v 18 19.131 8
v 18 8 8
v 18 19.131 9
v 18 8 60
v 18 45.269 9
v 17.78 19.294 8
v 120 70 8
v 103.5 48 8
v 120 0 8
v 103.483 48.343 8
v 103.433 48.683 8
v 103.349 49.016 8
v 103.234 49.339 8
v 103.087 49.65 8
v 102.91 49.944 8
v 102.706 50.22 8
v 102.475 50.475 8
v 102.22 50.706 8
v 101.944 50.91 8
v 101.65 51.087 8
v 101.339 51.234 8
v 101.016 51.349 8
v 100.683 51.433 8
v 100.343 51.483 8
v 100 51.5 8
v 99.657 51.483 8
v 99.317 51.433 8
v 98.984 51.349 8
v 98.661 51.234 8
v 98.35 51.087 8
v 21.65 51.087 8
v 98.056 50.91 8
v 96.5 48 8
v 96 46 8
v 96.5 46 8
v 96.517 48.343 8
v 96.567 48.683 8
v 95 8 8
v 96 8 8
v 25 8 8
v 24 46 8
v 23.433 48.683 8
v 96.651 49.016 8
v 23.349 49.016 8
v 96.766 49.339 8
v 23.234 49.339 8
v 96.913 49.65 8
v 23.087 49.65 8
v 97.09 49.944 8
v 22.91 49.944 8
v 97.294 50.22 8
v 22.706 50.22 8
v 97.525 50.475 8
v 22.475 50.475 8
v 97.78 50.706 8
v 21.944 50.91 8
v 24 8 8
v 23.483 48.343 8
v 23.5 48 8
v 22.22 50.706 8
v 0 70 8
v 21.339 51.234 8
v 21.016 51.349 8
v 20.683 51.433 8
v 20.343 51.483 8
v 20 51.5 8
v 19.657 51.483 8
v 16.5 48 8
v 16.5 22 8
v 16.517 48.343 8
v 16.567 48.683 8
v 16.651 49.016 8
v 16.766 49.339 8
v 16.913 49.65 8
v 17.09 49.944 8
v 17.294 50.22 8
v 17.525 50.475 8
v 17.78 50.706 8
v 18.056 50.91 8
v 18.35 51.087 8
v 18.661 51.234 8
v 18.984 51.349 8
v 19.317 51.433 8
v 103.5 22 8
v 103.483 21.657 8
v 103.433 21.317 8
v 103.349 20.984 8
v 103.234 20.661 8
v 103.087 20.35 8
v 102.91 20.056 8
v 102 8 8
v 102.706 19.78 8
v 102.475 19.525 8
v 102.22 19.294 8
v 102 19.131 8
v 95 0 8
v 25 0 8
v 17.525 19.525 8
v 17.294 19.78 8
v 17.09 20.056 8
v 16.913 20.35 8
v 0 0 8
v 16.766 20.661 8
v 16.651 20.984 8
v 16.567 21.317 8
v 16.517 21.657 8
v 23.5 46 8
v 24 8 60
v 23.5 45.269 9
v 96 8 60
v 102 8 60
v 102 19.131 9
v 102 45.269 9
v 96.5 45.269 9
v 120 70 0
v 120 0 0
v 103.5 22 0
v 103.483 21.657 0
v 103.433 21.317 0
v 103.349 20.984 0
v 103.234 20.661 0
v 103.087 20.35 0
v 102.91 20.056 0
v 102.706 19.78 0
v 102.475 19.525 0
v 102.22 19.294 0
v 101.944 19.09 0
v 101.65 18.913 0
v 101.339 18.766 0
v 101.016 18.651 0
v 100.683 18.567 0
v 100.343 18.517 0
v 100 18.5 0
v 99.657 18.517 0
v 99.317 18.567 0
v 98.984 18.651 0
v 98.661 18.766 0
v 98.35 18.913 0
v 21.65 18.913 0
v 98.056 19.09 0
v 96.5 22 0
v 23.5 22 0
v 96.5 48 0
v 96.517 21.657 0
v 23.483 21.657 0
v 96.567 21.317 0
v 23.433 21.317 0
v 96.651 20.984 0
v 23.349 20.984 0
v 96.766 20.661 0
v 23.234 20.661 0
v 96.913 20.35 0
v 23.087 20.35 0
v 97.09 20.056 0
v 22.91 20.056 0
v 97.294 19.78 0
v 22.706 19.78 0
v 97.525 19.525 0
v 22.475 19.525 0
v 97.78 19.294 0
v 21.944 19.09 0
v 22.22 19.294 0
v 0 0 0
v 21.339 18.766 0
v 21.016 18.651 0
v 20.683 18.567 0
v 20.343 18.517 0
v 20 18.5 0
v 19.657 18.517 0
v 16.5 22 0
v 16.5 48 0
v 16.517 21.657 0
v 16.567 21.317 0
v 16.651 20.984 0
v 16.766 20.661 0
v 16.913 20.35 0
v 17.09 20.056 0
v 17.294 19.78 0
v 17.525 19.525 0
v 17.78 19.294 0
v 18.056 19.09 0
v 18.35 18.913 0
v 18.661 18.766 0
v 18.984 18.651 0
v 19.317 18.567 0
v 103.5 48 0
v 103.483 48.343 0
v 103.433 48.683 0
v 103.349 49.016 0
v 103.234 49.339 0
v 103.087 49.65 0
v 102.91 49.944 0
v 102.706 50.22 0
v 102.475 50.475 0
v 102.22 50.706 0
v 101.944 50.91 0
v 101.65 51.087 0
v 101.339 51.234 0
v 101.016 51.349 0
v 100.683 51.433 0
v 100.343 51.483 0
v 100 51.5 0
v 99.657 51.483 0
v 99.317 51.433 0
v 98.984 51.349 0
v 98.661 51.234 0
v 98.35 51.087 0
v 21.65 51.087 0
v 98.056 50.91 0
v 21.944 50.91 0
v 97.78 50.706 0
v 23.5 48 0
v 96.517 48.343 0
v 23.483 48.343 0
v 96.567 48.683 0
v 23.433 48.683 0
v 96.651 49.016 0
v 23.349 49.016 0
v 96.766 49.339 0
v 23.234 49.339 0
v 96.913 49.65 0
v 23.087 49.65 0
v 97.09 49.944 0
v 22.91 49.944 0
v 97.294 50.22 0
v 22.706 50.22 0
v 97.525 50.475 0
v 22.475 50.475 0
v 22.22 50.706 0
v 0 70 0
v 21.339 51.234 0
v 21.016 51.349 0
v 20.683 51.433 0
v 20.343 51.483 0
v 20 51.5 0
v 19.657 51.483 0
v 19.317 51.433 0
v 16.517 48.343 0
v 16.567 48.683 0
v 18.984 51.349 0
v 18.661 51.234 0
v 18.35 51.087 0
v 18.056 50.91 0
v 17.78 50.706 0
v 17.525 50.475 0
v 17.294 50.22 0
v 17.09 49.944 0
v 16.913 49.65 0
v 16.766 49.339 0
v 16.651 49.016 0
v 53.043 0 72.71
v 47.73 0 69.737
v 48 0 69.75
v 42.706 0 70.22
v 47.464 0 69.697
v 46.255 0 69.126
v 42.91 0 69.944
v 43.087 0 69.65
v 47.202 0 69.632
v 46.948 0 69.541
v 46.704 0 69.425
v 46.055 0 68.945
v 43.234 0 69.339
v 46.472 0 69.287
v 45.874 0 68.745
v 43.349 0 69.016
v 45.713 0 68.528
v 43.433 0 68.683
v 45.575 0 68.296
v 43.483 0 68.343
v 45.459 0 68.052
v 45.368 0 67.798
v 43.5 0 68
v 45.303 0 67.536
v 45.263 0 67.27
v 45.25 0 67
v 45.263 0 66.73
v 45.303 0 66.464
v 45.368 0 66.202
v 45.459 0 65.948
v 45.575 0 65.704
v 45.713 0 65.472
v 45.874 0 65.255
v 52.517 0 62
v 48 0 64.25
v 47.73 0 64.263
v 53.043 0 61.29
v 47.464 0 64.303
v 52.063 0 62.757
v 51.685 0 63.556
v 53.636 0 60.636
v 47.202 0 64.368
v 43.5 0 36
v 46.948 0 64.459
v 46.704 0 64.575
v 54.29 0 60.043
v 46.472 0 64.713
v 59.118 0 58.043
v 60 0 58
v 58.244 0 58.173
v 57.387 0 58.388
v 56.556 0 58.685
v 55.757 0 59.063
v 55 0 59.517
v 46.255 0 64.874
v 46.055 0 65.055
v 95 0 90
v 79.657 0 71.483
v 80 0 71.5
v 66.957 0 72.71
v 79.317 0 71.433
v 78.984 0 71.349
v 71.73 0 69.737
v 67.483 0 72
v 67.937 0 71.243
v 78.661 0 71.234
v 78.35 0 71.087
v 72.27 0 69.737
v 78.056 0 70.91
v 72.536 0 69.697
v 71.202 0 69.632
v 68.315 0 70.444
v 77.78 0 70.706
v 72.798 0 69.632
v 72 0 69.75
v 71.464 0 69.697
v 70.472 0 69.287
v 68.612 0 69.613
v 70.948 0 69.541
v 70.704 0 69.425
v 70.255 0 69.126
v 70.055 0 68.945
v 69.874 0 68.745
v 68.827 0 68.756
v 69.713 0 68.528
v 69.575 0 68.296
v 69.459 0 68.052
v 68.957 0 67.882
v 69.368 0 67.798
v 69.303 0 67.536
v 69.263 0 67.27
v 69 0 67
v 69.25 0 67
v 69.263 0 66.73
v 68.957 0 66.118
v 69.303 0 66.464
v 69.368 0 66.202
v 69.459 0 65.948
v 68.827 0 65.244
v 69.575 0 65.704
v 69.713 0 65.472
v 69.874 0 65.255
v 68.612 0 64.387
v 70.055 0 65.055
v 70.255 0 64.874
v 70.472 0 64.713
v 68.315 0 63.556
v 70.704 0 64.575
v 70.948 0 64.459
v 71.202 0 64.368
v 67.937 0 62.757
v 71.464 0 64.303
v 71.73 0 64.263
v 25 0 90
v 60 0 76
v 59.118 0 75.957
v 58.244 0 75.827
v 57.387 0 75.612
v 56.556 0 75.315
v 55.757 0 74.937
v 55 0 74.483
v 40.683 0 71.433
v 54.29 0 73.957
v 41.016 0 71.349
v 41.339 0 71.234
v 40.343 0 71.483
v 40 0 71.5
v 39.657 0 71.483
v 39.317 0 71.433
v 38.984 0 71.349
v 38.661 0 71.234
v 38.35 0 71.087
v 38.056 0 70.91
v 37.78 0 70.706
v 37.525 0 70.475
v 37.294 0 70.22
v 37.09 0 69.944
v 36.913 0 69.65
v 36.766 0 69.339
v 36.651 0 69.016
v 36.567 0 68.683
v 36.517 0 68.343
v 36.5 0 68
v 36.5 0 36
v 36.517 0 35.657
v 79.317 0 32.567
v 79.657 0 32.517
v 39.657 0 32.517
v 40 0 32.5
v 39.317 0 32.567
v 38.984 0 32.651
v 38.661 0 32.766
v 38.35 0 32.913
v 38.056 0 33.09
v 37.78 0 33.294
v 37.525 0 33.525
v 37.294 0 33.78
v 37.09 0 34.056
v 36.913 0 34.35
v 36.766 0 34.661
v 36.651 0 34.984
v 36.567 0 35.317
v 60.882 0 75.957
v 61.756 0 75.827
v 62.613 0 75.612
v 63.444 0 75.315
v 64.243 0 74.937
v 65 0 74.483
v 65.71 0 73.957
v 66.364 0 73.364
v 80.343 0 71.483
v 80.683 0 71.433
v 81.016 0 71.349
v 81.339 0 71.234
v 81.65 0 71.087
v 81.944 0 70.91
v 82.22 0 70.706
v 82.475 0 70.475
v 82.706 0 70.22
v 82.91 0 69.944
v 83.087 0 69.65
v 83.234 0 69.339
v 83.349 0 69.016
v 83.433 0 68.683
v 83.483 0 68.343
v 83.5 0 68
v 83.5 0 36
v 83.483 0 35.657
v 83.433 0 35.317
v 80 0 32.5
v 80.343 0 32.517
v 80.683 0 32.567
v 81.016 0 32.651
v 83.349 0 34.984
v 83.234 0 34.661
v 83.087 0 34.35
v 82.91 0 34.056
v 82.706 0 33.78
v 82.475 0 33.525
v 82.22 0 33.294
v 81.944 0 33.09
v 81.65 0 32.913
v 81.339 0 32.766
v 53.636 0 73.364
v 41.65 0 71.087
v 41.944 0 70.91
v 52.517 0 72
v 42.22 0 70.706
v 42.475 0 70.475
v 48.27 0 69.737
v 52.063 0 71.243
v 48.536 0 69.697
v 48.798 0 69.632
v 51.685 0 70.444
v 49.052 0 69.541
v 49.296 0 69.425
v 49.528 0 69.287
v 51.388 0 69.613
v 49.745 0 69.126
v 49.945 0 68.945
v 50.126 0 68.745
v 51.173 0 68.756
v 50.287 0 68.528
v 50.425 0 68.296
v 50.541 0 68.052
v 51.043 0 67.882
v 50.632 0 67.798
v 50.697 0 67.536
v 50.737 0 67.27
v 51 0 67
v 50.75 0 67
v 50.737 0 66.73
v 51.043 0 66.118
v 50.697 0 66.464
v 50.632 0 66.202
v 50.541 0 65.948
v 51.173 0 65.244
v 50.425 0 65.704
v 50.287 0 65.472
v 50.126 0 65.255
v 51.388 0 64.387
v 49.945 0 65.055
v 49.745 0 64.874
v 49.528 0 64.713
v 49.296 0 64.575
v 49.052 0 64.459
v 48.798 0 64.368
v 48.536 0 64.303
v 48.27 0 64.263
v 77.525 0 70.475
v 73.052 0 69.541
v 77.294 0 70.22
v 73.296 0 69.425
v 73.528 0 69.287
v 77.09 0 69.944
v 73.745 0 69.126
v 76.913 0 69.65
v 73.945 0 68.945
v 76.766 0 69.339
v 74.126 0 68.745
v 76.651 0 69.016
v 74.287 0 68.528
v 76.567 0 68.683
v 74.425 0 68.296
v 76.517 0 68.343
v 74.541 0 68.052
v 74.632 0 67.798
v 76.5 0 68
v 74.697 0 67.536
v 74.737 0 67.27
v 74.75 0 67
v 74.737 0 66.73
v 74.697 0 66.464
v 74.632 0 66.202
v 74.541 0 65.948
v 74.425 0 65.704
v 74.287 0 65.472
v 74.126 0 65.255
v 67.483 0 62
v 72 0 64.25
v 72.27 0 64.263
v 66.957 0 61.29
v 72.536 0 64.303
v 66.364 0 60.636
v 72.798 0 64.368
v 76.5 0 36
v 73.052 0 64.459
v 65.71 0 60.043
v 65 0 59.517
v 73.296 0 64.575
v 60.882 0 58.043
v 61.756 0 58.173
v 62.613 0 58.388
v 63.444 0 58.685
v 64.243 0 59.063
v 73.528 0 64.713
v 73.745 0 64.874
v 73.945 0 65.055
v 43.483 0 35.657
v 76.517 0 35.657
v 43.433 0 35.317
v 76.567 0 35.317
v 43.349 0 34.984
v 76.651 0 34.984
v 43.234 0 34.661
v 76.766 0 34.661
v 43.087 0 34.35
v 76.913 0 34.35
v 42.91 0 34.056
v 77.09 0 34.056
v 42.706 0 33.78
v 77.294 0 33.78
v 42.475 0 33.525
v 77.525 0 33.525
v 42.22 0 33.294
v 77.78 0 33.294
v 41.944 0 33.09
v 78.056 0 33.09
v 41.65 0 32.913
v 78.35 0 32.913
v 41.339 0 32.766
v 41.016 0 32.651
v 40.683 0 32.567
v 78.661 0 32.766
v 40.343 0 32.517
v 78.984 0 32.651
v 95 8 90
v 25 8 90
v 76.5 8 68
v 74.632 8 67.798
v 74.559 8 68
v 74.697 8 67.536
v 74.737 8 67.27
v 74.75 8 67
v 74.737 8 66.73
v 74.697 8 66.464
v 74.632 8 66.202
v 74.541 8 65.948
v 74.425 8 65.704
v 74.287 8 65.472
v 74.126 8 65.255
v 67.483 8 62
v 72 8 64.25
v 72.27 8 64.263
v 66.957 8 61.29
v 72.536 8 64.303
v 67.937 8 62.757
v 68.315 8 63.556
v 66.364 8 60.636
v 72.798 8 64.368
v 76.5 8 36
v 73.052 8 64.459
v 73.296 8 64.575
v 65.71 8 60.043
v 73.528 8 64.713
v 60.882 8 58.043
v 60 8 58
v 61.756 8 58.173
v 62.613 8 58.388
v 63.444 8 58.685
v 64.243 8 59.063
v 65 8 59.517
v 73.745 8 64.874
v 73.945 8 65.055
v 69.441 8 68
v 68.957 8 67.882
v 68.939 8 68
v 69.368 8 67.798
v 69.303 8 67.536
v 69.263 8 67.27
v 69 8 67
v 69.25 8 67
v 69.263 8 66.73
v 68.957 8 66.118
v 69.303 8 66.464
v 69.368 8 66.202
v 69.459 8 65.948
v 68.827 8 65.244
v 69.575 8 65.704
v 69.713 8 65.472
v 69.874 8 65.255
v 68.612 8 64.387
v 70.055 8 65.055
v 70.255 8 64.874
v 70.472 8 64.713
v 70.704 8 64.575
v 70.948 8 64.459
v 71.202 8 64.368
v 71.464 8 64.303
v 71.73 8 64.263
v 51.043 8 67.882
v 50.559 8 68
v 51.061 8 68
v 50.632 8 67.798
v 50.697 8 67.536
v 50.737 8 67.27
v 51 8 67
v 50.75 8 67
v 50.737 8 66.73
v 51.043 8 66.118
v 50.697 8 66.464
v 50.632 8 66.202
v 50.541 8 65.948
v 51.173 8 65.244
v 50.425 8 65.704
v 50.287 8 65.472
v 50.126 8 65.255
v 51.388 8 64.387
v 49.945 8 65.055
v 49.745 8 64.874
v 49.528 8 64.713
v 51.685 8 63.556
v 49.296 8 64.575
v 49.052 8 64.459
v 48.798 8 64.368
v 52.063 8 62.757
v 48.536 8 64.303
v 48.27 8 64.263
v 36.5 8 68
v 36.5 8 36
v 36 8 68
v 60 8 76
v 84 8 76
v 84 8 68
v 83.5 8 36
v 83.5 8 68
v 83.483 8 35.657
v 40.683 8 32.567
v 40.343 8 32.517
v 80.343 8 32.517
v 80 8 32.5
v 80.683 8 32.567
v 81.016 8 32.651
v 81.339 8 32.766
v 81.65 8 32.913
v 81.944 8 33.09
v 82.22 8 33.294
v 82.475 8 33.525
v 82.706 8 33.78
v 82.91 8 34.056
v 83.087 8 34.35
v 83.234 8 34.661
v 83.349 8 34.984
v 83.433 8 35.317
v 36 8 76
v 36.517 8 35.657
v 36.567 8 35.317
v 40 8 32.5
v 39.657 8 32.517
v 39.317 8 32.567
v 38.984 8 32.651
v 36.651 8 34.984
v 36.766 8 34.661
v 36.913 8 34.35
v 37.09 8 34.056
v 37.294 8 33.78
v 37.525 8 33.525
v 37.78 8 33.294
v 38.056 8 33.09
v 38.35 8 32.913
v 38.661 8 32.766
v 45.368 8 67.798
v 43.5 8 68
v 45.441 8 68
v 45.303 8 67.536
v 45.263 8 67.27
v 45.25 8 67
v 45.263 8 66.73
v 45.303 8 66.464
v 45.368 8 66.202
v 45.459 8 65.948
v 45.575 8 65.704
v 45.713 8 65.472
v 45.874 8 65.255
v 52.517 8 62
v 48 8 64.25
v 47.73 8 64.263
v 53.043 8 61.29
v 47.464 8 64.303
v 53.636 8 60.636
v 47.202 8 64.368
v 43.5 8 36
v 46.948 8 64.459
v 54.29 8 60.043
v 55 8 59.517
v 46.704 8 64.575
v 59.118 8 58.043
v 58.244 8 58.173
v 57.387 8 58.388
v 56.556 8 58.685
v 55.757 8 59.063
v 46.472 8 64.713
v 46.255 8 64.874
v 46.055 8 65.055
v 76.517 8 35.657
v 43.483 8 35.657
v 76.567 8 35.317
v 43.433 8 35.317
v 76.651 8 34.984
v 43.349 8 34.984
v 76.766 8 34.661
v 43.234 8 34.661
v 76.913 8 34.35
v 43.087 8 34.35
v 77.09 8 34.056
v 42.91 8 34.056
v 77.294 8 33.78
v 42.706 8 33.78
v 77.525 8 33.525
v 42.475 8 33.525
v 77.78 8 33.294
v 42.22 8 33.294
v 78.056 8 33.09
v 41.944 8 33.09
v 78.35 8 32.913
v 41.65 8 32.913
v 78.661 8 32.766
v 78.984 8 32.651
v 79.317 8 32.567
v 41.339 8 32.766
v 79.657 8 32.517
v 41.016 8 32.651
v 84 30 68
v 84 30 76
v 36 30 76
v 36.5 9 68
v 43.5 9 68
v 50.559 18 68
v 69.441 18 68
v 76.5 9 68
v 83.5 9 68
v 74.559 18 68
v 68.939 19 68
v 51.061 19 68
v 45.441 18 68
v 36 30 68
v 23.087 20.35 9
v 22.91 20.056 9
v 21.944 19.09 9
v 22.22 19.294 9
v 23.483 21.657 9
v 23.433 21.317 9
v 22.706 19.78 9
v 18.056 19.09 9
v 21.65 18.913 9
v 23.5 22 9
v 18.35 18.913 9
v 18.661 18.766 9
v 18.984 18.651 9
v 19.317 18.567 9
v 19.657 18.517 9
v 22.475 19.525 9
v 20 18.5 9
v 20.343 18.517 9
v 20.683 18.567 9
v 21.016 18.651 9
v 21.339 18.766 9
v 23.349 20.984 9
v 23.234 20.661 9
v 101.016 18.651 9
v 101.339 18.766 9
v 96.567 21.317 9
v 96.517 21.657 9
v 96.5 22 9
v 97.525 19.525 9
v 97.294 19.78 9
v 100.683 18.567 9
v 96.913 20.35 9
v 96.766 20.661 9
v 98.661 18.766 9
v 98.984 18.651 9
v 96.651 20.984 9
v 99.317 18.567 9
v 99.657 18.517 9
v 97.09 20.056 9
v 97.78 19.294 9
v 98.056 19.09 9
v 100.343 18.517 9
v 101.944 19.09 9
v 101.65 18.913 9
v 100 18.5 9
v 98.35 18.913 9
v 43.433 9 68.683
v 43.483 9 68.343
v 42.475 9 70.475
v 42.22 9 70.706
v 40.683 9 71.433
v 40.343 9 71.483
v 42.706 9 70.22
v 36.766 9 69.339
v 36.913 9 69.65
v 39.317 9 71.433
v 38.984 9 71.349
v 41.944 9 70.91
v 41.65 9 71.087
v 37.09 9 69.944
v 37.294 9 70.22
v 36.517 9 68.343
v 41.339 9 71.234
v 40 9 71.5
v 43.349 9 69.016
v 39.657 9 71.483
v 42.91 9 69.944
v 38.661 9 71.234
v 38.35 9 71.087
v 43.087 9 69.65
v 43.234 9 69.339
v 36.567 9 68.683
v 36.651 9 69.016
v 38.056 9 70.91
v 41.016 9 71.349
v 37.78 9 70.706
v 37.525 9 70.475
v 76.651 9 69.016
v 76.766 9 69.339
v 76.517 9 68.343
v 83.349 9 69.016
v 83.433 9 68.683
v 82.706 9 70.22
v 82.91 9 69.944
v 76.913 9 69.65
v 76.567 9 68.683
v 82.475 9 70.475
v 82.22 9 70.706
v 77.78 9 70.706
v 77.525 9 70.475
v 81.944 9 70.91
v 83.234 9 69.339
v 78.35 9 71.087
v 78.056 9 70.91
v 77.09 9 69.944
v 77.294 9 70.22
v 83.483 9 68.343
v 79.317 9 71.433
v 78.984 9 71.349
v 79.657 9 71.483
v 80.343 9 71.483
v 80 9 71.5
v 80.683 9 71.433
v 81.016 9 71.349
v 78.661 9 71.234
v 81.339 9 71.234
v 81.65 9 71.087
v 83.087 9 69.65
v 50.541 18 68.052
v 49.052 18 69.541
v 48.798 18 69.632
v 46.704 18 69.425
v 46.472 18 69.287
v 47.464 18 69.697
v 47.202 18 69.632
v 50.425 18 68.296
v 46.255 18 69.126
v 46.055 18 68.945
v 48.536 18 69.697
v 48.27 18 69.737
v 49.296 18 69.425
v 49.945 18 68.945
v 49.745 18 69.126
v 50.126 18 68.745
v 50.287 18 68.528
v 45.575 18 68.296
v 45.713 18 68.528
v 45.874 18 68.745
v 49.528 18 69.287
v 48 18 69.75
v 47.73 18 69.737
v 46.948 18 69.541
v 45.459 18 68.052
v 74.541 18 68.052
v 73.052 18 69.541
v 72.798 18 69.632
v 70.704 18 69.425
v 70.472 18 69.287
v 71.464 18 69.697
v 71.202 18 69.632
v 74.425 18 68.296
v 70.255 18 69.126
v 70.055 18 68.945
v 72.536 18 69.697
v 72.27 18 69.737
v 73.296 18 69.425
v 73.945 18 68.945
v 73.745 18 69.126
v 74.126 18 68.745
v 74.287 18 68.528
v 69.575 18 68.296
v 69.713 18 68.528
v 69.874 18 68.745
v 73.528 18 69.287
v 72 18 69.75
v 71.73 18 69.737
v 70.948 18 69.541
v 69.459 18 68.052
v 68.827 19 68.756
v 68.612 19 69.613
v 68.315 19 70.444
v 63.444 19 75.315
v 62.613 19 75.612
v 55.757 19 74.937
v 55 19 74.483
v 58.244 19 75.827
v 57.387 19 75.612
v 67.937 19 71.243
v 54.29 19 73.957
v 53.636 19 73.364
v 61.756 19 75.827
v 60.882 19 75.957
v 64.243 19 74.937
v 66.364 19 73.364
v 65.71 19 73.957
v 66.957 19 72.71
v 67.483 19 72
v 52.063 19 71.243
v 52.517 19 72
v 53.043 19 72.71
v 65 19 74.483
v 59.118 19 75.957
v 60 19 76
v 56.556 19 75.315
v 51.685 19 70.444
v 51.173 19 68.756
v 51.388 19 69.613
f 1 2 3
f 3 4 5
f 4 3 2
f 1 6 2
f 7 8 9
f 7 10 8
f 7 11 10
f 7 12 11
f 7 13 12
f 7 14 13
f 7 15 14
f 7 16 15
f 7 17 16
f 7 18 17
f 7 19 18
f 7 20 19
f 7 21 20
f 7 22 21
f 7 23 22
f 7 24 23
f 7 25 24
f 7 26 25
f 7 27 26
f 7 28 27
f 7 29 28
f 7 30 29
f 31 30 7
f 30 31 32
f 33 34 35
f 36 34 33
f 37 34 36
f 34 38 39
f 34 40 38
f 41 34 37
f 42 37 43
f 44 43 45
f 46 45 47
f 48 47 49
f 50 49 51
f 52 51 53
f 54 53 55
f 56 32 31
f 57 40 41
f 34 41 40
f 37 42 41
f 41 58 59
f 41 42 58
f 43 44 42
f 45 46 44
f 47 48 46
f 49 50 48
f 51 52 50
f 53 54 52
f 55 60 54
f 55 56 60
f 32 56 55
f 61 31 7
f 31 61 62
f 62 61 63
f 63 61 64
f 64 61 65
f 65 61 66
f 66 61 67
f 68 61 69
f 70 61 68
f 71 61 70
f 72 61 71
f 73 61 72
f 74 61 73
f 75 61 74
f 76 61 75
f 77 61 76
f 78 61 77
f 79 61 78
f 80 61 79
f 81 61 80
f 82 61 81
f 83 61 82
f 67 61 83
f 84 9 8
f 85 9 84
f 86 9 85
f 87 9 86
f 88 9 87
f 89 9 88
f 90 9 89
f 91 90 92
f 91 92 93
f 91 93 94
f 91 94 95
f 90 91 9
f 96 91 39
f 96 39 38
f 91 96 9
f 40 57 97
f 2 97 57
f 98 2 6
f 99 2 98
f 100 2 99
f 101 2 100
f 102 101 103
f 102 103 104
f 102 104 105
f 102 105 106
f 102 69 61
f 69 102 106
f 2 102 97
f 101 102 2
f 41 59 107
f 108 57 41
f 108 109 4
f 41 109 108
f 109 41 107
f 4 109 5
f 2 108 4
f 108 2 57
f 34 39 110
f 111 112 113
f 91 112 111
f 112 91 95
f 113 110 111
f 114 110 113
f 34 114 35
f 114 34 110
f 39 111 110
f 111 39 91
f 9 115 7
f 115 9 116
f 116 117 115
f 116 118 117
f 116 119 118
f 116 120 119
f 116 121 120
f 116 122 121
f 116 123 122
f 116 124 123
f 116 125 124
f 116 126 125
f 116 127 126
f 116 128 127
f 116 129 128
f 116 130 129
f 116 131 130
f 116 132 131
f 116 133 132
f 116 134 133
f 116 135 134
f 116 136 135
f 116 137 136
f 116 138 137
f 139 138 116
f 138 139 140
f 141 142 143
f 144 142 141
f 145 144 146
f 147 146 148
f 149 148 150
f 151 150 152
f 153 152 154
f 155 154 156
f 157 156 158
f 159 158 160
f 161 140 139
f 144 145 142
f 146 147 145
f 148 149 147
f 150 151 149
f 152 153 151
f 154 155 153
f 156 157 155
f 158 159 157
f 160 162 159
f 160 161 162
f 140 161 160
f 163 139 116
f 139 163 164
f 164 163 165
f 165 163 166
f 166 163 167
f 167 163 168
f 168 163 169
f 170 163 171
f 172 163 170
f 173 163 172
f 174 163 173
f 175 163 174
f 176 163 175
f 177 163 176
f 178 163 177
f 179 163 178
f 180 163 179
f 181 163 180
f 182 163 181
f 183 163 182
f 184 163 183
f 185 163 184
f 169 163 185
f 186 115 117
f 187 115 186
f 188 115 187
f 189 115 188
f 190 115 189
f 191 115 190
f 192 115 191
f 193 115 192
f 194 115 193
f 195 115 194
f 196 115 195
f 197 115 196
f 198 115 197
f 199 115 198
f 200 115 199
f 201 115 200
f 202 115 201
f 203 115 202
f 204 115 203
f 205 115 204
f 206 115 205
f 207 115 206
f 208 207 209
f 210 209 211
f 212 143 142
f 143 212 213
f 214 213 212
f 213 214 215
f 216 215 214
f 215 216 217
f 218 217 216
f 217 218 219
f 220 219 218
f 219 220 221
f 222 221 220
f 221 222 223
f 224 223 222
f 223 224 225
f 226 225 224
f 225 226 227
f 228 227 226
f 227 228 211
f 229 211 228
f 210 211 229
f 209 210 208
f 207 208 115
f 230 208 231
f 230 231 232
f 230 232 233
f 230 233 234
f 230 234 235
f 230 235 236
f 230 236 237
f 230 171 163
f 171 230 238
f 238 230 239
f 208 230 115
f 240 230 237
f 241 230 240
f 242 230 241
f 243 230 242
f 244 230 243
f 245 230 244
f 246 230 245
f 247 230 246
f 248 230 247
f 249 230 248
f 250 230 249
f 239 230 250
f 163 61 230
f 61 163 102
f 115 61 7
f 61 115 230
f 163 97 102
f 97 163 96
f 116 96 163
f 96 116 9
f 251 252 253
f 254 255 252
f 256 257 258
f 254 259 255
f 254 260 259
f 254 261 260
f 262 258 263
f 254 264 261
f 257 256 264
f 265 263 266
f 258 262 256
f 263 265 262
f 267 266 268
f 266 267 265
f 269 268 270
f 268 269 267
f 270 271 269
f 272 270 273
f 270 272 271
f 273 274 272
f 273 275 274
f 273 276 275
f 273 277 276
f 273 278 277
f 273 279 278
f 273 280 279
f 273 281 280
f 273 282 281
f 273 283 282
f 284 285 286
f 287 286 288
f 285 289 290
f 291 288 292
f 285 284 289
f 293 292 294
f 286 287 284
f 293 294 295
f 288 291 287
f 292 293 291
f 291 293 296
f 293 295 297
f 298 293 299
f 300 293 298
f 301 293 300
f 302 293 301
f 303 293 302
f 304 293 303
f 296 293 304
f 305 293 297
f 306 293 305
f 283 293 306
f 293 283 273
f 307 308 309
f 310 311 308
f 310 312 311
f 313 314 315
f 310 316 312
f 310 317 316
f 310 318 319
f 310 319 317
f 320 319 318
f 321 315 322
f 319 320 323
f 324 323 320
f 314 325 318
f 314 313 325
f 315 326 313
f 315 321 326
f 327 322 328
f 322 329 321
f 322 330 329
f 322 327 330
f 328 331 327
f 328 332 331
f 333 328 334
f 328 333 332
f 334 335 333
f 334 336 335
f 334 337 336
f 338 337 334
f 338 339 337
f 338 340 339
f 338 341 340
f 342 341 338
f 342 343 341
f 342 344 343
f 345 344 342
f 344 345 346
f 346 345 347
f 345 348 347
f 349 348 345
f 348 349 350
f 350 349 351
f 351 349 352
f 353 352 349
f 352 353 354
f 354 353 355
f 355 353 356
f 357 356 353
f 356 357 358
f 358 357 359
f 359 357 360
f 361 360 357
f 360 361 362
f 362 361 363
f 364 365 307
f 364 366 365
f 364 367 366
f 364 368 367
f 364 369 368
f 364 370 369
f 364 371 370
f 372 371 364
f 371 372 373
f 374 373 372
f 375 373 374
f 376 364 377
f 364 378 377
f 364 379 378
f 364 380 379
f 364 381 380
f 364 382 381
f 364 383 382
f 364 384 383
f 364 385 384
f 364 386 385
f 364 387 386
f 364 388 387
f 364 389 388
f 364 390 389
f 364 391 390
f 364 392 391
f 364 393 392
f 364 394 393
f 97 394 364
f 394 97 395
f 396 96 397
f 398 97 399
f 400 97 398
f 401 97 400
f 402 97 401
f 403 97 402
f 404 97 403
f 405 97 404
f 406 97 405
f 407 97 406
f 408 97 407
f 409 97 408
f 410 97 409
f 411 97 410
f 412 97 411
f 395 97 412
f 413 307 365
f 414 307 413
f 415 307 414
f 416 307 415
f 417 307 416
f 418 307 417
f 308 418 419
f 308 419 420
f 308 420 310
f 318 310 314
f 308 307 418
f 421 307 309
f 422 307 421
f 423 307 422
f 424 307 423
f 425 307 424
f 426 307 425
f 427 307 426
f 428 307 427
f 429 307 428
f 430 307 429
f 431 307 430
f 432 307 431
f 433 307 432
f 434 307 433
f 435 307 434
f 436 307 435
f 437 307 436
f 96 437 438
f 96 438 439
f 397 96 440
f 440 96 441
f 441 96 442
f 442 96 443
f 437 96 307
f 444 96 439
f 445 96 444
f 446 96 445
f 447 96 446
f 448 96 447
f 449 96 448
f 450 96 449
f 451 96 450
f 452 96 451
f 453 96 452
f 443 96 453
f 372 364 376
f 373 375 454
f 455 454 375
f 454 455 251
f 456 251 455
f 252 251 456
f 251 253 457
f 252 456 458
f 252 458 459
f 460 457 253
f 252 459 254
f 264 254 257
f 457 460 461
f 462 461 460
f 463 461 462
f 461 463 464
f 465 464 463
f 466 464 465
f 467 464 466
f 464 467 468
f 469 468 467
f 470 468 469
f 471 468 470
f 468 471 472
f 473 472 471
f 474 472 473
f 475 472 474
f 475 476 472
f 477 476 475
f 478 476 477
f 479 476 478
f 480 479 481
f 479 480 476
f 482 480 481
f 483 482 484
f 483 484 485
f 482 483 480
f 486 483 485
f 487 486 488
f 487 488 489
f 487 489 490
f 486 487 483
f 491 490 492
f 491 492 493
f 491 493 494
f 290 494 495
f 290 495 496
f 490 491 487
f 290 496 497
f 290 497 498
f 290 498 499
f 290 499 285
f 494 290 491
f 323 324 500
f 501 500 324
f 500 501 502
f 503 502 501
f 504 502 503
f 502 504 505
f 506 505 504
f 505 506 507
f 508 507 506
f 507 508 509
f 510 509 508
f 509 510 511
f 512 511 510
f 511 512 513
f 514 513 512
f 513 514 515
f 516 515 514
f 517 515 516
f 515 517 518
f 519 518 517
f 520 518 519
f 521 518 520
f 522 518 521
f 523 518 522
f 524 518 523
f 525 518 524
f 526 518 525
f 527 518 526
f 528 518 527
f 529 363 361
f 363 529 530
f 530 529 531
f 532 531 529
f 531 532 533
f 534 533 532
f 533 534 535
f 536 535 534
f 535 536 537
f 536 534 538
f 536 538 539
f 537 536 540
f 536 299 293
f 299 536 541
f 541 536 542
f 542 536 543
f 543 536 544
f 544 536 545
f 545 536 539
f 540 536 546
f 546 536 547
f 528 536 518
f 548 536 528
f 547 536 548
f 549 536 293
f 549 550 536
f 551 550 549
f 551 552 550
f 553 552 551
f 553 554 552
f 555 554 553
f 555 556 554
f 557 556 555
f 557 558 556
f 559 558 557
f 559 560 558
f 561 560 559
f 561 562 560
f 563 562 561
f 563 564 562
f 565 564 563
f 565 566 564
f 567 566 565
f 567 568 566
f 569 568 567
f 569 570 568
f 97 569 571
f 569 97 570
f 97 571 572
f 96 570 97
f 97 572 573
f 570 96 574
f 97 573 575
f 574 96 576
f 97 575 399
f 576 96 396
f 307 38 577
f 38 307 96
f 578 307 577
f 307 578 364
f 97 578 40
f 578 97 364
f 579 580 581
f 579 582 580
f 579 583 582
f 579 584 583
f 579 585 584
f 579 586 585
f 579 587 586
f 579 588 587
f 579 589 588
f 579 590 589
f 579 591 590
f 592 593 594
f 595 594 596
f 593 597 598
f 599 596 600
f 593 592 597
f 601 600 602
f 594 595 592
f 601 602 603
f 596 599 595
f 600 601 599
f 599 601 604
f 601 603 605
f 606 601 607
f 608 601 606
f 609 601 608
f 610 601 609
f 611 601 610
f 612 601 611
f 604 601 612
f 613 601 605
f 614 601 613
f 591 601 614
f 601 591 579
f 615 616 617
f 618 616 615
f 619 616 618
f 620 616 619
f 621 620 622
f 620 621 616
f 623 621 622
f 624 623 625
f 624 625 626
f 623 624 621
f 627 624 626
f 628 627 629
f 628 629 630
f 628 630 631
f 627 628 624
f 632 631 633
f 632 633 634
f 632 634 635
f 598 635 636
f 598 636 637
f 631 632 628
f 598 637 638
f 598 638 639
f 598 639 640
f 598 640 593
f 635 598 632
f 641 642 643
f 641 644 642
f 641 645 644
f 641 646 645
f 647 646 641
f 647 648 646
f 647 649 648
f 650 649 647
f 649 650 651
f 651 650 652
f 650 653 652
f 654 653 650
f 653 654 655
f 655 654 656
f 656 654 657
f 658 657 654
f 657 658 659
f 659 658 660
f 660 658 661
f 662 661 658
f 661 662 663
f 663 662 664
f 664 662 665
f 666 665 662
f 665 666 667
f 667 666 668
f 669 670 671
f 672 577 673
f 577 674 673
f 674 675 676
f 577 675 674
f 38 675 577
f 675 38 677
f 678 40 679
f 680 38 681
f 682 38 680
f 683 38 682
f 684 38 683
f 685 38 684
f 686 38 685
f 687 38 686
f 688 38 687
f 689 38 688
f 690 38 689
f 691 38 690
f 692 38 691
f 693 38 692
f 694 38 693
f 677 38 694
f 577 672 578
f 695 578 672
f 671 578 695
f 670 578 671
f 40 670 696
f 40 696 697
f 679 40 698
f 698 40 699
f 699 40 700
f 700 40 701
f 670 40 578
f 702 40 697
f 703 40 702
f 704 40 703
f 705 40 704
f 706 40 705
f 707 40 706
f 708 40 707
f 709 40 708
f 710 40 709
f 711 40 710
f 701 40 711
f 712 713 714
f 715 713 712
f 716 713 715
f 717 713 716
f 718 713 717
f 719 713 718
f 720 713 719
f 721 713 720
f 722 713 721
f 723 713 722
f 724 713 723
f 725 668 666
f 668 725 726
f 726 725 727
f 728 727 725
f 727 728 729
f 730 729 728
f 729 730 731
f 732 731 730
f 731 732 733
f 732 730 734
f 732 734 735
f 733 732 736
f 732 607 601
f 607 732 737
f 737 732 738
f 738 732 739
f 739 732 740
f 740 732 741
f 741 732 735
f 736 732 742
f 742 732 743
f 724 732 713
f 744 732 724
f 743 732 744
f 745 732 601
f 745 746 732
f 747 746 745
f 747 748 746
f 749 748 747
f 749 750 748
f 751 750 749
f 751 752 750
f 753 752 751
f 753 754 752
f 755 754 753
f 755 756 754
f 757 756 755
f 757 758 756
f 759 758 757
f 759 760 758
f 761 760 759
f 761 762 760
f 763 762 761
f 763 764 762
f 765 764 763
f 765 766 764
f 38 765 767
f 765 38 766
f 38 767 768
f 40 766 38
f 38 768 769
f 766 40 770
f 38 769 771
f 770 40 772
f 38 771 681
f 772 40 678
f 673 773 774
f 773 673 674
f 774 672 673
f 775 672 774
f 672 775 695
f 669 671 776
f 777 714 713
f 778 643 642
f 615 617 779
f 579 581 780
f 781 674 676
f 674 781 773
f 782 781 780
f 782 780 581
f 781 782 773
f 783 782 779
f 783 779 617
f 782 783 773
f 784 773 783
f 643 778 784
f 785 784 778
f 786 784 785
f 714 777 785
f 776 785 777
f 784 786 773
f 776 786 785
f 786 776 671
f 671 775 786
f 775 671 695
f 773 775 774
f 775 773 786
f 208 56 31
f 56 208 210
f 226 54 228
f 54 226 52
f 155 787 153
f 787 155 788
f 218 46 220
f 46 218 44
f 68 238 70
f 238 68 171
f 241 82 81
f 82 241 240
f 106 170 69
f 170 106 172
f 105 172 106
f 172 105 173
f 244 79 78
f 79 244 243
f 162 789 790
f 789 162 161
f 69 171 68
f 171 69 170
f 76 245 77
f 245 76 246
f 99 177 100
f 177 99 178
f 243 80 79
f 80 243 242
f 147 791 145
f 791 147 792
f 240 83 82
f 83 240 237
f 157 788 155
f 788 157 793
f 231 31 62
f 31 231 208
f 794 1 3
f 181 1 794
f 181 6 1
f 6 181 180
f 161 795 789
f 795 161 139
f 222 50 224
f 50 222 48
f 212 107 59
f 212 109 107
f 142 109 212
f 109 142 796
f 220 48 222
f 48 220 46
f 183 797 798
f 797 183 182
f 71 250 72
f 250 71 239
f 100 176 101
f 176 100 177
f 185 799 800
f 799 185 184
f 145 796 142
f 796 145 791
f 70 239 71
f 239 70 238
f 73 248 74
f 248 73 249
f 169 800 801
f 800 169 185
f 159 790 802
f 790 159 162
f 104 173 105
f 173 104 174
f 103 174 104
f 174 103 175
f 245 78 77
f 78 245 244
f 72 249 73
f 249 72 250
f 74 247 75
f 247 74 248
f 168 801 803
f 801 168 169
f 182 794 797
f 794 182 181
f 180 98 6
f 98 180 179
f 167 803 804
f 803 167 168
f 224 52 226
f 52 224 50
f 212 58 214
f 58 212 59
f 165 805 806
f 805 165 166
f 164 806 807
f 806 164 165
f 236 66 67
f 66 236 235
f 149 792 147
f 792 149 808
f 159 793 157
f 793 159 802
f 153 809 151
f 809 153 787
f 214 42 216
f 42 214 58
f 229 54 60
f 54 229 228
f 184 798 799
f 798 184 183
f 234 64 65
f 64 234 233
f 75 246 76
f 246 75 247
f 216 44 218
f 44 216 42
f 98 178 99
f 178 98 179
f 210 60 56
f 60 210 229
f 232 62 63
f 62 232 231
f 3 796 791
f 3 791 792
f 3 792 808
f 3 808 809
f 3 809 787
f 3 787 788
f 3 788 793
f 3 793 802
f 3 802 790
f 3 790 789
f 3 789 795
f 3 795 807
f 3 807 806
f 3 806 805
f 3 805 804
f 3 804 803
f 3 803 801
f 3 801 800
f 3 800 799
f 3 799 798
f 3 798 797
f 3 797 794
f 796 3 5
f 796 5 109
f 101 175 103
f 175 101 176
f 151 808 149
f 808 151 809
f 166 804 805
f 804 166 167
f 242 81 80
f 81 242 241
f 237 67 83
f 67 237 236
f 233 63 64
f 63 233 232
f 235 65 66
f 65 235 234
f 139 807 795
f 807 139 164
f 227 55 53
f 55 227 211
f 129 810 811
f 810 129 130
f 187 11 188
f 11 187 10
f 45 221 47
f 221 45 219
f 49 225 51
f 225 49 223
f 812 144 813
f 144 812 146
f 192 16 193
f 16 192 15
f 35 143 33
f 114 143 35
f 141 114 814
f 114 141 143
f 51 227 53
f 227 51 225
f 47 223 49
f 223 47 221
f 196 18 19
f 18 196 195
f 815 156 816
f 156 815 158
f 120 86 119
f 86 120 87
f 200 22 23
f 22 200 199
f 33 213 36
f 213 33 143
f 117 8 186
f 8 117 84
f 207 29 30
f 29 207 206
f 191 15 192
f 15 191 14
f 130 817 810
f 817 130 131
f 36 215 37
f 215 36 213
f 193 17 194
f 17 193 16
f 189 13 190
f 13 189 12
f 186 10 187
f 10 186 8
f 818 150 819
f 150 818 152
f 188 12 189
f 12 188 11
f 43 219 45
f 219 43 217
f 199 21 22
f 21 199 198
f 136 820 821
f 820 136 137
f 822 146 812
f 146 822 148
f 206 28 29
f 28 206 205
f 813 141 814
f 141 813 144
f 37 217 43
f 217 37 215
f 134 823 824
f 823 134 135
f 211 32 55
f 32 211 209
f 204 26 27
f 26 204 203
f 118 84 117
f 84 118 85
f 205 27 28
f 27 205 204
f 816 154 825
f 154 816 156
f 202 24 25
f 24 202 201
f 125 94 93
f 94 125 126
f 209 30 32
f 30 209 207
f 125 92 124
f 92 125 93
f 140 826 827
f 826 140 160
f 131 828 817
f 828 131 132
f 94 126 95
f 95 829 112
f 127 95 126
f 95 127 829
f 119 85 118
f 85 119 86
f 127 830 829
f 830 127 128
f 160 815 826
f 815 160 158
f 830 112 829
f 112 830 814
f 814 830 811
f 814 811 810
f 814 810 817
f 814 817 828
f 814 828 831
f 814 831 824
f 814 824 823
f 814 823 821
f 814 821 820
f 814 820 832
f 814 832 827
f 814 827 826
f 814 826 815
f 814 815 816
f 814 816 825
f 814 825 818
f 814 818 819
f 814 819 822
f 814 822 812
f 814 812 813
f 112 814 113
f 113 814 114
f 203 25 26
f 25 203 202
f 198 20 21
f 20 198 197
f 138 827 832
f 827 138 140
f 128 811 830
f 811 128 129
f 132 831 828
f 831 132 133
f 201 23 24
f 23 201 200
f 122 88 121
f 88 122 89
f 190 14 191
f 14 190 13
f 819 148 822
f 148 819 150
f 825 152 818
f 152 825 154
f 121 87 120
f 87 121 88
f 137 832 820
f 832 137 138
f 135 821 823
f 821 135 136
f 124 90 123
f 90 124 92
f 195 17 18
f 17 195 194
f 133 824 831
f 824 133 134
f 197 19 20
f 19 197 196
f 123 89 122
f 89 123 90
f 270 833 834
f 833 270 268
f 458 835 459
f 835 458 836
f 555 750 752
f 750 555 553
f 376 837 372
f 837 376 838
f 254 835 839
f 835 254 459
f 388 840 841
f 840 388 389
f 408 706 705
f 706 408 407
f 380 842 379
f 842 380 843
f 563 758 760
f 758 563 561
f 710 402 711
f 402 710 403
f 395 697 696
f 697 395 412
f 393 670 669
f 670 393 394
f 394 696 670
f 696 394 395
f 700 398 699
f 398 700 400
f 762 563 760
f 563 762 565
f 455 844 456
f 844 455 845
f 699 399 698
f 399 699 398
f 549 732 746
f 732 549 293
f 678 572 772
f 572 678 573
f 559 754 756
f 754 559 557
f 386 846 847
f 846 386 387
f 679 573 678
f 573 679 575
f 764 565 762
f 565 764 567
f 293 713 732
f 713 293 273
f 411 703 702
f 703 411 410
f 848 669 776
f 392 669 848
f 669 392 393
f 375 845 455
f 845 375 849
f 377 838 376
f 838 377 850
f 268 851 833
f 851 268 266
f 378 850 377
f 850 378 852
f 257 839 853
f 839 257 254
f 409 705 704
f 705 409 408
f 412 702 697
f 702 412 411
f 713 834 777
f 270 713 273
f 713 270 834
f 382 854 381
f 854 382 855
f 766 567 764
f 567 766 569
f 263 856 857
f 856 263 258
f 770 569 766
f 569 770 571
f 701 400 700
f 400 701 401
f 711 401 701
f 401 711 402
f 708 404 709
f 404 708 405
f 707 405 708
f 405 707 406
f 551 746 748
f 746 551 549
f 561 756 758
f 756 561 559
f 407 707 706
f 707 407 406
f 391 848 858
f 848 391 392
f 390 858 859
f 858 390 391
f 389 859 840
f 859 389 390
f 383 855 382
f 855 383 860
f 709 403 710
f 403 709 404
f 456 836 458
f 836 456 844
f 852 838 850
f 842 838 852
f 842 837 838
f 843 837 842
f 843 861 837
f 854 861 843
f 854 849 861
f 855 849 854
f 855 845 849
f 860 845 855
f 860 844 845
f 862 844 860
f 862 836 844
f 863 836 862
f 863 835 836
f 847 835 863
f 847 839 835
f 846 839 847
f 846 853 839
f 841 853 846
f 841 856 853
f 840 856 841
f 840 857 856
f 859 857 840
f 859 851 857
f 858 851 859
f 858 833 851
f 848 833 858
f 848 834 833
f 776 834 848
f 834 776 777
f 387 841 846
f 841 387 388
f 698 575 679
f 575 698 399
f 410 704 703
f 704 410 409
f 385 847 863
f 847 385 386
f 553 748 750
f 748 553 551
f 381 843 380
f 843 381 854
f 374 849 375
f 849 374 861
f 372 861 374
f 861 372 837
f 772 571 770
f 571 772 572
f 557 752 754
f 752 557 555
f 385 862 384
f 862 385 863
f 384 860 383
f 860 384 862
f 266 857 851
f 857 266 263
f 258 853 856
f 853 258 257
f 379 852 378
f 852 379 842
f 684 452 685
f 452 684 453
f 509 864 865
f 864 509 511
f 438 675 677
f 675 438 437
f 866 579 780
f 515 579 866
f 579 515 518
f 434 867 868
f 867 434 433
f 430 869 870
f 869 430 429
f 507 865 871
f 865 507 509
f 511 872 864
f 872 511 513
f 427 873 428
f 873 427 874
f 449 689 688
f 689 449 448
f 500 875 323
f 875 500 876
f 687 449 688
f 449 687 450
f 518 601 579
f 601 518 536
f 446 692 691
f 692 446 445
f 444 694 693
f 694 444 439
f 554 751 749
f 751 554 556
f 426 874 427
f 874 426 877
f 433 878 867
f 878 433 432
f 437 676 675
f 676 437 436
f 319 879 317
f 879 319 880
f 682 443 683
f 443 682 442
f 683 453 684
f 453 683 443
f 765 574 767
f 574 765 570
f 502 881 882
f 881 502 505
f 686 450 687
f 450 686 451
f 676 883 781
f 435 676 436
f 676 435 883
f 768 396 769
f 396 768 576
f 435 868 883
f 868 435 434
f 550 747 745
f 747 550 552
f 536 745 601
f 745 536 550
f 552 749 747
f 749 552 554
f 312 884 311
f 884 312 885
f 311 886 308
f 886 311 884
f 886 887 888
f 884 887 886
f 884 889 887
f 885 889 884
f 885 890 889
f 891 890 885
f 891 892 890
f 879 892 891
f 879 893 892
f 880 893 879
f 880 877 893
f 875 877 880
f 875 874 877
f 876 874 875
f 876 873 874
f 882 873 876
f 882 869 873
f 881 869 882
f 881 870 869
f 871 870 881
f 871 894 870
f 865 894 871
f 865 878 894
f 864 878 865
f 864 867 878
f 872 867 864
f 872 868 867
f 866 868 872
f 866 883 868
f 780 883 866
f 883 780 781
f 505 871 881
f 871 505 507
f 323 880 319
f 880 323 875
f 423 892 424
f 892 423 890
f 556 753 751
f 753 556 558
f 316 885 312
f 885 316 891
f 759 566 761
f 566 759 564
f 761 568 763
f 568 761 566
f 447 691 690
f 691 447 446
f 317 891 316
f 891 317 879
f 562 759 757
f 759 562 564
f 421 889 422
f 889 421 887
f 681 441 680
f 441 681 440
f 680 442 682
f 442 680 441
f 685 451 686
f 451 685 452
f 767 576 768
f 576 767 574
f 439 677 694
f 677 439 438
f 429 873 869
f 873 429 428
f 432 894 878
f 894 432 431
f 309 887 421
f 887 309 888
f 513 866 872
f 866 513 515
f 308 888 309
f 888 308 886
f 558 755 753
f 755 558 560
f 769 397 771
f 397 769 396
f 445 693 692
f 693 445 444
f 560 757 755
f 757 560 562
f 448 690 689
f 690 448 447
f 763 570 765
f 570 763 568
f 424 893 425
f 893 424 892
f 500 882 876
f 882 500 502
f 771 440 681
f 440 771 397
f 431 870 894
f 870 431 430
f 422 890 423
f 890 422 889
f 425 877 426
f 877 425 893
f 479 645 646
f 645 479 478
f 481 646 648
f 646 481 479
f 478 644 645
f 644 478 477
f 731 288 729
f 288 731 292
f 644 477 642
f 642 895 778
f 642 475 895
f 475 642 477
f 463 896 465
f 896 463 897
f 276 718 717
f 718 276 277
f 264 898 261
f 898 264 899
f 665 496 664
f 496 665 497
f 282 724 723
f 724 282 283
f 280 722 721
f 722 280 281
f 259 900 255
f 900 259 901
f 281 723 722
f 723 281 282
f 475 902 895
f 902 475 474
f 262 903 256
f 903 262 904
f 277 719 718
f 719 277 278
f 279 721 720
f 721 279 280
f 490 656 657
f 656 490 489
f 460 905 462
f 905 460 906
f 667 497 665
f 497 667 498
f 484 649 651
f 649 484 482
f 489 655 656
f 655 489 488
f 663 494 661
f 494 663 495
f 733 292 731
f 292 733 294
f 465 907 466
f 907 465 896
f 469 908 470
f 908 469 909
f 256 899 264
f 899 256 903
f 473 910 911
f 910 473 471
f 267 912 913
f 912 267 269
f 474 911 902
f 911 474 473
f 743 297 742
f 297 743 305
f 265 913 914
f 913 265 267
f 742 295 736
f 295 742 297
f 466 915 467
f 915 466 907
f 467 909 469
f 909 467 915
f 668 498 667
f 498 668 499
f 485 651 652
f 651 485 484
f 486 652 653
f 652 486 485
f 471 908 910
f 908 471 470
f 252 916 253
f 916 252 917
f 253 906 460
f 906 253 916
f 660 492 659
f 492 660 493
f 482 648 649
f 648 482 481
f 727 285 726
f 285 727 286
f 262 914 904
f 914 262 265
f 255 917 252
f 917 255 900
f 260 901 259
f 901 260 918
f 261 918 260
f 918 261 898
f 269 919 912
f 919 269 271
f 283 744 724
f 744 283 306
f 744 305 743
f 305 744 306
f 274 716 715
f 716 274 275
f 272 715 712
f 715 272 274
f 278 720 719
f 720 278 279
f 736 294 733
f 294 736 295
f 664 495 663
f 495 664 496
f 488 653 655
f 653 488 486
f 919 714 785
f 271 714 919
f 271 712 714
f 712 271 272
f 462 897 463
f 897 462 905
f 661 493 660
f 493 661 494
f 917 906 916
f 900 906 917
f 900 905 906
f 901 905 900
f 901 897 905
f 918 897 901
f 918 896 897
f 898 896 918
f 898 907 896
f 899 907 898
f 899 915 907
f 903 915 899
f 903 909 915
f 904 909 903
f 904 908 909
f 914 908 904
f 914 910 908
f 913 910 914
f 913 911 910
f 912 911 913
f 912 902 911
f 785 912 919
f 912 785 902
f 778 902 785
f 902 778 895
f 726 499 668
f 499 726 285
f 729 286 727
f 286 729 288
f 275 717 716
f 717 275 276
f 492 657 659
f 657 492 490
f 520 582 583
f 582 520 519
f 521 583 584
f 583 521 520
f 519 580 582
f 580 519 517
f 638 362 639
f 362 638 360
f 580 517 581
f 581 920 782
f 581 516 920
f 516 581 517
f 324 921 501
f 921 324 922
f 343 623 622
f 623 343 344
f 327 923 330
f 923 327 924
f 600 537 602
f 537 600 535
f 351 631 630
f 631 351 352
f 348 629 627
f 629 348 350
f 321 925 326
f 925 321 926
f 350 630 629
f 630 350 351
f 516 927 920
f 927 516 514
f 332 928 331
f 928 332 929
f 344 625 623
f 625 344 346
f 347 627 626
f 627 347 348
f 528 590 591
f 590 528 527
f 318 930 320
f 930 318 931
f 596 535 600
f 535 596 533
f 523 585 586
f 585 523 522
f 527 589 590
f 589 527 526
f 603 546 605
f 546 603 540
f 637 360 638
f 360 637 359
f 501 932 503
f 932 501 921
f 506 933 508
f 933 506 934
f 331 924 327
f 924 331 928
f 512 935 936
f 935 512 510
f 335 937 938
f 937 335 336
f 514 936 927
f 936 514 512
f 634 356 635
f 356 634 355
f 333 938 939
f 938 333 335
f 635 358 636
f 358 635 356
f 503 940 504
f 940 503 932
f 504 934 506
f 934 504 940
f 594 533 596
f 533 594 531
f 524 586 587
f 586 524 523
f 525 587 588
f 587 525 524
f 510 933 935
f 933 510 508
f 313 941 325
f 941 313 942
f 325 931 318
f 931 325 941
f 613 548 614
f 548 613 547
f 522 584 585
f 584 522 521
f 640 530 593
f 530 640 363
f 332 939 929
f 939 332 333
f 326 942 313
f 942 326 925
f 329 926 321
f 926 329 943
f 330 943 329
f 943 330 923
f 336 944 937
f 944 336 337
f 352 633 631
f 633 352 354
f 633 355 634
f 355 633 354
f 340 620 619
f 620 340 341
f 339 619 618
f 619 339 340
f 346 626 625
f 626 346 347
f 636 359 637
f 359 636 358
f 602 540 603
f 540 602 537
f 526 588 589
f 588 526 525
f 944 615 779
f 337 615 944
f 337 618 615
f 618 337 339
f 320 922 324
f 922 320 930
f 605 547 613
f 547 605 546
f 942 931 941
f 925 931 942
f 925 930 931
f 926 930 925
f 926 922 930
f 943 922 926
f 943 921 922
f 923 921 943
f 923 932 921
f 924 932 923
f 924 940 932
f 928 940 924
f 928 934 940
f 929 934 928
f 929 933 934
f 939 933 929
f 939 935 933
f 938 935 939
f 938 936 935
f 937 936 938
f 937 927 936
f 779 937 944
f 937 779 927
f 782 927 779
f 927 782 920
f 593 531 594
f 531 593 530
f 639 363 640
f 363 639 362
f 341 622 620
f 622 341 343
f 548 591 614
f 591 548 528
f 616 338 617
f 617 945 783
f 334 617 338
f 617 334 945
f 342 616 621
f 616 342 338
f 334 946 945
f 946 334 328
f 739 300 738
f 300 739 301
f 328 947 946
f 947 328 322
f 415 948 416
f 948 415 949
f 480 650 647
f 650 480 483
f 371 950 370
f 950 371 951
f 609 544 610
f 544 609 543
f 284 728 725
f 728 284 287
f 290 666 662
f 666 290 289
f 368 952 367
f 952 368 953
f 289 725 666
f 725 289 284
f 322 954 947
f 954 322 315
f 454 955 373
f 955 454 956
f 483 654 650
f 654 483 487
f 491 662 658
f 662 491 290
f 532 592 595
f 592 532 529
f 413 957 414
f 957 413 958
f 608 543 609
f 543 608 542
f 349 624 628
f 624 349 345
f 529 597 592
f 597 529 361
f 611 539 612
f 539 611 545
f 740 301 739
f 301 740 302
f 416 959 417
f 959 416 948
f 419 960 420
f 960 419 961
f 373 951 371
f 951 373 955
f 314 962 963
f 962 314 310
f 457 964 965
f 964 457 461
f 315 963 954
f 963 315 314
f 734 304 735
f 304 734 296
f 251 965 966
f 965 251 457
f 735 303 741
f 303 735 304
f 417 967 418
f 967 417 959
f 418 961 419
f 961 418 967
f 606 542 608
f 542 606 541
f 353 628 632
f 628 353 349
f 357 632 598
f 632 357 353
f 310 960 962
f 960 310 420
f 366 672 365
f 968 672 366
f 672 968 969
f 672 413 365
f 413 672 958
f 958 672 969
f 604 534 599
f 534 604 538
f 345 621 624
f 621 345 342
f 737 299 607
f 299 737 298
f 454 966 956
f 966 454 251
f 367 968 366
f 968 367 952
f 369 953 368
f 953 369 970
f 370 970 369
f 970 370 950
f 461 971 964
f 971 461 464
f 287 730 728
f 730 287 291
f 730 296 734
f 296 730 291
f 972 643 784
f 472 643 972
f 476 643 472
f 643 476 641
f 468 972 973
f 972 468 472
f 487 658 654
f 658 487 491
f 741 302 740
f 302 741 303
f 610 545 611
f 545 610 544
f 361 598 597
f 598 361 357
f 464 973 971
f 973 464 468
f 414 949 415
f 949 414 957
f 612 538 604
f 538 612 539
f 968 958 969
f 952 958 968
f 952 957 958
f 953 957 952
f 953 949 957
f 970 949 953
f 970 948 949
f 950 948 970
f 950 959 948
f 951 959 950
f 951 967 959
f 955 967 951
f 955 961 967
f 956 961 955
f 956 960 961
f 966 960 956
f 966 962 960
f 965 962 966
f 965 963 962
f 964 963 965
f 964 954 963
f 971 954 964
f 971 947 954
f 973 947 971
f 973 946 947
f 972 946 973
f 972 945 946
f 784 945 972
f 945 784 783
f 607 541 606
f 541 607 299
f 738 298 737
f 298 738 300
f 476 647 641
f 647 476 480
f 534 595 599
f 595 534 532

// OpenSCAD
// Original MechIntel educational model. CC0-1.0. Units: mm.
// Not a standardized or load-rated component.
$fn=96;
base_length=120; base_depth=70; base_thickness=8; mast_width=70; mast_height=90; wall=8; slot=7; sensor_bore=18;
$fn=64;
difference(){
 union(){
  cube([base_length,base_depth,base_thickness]);
  translate([(base_length-mast_width)/2,0,0]) cube([mast_width,wall,mast_height]);
  for(x=[18,base_length-24]) translate([x,wall,base_thickness]) rotate([90,0,90]) linear_extrude(height=6) polygon([[0,0],[38,0],[0,52]]);
  translate([(base_length-48)/2,wall,68]) cube([48,22,8]);
 }
 for(x=[20,base_length-20]) hull(){translate([x,22,-1]) cylinder(d=slot,h=base_thickness+2);translate([x,48,-1]) cylinder(d=slot,h=base_thickness+2);}
 for(x=[base_length/2-20,base_length/2+20]) hull(){translate([x,-1,36]) rotate([-90,0,0]) cylinder(d=slot,h=wall+2);translate([x,-1,68]) rotate([-90,0,0]) cylinder(d=slot,h=wall+2);}
 translate([base_length/2,wall+11,67]) rotate([90,0,0]) cylinder(d=sensor_bore,h=24);
 for(x=[base_length/2-12,base_length/2+12]) translate([x,wall+10,67]) rotate([90,0,0]) cylinder(d=5.5,h=24);
}
